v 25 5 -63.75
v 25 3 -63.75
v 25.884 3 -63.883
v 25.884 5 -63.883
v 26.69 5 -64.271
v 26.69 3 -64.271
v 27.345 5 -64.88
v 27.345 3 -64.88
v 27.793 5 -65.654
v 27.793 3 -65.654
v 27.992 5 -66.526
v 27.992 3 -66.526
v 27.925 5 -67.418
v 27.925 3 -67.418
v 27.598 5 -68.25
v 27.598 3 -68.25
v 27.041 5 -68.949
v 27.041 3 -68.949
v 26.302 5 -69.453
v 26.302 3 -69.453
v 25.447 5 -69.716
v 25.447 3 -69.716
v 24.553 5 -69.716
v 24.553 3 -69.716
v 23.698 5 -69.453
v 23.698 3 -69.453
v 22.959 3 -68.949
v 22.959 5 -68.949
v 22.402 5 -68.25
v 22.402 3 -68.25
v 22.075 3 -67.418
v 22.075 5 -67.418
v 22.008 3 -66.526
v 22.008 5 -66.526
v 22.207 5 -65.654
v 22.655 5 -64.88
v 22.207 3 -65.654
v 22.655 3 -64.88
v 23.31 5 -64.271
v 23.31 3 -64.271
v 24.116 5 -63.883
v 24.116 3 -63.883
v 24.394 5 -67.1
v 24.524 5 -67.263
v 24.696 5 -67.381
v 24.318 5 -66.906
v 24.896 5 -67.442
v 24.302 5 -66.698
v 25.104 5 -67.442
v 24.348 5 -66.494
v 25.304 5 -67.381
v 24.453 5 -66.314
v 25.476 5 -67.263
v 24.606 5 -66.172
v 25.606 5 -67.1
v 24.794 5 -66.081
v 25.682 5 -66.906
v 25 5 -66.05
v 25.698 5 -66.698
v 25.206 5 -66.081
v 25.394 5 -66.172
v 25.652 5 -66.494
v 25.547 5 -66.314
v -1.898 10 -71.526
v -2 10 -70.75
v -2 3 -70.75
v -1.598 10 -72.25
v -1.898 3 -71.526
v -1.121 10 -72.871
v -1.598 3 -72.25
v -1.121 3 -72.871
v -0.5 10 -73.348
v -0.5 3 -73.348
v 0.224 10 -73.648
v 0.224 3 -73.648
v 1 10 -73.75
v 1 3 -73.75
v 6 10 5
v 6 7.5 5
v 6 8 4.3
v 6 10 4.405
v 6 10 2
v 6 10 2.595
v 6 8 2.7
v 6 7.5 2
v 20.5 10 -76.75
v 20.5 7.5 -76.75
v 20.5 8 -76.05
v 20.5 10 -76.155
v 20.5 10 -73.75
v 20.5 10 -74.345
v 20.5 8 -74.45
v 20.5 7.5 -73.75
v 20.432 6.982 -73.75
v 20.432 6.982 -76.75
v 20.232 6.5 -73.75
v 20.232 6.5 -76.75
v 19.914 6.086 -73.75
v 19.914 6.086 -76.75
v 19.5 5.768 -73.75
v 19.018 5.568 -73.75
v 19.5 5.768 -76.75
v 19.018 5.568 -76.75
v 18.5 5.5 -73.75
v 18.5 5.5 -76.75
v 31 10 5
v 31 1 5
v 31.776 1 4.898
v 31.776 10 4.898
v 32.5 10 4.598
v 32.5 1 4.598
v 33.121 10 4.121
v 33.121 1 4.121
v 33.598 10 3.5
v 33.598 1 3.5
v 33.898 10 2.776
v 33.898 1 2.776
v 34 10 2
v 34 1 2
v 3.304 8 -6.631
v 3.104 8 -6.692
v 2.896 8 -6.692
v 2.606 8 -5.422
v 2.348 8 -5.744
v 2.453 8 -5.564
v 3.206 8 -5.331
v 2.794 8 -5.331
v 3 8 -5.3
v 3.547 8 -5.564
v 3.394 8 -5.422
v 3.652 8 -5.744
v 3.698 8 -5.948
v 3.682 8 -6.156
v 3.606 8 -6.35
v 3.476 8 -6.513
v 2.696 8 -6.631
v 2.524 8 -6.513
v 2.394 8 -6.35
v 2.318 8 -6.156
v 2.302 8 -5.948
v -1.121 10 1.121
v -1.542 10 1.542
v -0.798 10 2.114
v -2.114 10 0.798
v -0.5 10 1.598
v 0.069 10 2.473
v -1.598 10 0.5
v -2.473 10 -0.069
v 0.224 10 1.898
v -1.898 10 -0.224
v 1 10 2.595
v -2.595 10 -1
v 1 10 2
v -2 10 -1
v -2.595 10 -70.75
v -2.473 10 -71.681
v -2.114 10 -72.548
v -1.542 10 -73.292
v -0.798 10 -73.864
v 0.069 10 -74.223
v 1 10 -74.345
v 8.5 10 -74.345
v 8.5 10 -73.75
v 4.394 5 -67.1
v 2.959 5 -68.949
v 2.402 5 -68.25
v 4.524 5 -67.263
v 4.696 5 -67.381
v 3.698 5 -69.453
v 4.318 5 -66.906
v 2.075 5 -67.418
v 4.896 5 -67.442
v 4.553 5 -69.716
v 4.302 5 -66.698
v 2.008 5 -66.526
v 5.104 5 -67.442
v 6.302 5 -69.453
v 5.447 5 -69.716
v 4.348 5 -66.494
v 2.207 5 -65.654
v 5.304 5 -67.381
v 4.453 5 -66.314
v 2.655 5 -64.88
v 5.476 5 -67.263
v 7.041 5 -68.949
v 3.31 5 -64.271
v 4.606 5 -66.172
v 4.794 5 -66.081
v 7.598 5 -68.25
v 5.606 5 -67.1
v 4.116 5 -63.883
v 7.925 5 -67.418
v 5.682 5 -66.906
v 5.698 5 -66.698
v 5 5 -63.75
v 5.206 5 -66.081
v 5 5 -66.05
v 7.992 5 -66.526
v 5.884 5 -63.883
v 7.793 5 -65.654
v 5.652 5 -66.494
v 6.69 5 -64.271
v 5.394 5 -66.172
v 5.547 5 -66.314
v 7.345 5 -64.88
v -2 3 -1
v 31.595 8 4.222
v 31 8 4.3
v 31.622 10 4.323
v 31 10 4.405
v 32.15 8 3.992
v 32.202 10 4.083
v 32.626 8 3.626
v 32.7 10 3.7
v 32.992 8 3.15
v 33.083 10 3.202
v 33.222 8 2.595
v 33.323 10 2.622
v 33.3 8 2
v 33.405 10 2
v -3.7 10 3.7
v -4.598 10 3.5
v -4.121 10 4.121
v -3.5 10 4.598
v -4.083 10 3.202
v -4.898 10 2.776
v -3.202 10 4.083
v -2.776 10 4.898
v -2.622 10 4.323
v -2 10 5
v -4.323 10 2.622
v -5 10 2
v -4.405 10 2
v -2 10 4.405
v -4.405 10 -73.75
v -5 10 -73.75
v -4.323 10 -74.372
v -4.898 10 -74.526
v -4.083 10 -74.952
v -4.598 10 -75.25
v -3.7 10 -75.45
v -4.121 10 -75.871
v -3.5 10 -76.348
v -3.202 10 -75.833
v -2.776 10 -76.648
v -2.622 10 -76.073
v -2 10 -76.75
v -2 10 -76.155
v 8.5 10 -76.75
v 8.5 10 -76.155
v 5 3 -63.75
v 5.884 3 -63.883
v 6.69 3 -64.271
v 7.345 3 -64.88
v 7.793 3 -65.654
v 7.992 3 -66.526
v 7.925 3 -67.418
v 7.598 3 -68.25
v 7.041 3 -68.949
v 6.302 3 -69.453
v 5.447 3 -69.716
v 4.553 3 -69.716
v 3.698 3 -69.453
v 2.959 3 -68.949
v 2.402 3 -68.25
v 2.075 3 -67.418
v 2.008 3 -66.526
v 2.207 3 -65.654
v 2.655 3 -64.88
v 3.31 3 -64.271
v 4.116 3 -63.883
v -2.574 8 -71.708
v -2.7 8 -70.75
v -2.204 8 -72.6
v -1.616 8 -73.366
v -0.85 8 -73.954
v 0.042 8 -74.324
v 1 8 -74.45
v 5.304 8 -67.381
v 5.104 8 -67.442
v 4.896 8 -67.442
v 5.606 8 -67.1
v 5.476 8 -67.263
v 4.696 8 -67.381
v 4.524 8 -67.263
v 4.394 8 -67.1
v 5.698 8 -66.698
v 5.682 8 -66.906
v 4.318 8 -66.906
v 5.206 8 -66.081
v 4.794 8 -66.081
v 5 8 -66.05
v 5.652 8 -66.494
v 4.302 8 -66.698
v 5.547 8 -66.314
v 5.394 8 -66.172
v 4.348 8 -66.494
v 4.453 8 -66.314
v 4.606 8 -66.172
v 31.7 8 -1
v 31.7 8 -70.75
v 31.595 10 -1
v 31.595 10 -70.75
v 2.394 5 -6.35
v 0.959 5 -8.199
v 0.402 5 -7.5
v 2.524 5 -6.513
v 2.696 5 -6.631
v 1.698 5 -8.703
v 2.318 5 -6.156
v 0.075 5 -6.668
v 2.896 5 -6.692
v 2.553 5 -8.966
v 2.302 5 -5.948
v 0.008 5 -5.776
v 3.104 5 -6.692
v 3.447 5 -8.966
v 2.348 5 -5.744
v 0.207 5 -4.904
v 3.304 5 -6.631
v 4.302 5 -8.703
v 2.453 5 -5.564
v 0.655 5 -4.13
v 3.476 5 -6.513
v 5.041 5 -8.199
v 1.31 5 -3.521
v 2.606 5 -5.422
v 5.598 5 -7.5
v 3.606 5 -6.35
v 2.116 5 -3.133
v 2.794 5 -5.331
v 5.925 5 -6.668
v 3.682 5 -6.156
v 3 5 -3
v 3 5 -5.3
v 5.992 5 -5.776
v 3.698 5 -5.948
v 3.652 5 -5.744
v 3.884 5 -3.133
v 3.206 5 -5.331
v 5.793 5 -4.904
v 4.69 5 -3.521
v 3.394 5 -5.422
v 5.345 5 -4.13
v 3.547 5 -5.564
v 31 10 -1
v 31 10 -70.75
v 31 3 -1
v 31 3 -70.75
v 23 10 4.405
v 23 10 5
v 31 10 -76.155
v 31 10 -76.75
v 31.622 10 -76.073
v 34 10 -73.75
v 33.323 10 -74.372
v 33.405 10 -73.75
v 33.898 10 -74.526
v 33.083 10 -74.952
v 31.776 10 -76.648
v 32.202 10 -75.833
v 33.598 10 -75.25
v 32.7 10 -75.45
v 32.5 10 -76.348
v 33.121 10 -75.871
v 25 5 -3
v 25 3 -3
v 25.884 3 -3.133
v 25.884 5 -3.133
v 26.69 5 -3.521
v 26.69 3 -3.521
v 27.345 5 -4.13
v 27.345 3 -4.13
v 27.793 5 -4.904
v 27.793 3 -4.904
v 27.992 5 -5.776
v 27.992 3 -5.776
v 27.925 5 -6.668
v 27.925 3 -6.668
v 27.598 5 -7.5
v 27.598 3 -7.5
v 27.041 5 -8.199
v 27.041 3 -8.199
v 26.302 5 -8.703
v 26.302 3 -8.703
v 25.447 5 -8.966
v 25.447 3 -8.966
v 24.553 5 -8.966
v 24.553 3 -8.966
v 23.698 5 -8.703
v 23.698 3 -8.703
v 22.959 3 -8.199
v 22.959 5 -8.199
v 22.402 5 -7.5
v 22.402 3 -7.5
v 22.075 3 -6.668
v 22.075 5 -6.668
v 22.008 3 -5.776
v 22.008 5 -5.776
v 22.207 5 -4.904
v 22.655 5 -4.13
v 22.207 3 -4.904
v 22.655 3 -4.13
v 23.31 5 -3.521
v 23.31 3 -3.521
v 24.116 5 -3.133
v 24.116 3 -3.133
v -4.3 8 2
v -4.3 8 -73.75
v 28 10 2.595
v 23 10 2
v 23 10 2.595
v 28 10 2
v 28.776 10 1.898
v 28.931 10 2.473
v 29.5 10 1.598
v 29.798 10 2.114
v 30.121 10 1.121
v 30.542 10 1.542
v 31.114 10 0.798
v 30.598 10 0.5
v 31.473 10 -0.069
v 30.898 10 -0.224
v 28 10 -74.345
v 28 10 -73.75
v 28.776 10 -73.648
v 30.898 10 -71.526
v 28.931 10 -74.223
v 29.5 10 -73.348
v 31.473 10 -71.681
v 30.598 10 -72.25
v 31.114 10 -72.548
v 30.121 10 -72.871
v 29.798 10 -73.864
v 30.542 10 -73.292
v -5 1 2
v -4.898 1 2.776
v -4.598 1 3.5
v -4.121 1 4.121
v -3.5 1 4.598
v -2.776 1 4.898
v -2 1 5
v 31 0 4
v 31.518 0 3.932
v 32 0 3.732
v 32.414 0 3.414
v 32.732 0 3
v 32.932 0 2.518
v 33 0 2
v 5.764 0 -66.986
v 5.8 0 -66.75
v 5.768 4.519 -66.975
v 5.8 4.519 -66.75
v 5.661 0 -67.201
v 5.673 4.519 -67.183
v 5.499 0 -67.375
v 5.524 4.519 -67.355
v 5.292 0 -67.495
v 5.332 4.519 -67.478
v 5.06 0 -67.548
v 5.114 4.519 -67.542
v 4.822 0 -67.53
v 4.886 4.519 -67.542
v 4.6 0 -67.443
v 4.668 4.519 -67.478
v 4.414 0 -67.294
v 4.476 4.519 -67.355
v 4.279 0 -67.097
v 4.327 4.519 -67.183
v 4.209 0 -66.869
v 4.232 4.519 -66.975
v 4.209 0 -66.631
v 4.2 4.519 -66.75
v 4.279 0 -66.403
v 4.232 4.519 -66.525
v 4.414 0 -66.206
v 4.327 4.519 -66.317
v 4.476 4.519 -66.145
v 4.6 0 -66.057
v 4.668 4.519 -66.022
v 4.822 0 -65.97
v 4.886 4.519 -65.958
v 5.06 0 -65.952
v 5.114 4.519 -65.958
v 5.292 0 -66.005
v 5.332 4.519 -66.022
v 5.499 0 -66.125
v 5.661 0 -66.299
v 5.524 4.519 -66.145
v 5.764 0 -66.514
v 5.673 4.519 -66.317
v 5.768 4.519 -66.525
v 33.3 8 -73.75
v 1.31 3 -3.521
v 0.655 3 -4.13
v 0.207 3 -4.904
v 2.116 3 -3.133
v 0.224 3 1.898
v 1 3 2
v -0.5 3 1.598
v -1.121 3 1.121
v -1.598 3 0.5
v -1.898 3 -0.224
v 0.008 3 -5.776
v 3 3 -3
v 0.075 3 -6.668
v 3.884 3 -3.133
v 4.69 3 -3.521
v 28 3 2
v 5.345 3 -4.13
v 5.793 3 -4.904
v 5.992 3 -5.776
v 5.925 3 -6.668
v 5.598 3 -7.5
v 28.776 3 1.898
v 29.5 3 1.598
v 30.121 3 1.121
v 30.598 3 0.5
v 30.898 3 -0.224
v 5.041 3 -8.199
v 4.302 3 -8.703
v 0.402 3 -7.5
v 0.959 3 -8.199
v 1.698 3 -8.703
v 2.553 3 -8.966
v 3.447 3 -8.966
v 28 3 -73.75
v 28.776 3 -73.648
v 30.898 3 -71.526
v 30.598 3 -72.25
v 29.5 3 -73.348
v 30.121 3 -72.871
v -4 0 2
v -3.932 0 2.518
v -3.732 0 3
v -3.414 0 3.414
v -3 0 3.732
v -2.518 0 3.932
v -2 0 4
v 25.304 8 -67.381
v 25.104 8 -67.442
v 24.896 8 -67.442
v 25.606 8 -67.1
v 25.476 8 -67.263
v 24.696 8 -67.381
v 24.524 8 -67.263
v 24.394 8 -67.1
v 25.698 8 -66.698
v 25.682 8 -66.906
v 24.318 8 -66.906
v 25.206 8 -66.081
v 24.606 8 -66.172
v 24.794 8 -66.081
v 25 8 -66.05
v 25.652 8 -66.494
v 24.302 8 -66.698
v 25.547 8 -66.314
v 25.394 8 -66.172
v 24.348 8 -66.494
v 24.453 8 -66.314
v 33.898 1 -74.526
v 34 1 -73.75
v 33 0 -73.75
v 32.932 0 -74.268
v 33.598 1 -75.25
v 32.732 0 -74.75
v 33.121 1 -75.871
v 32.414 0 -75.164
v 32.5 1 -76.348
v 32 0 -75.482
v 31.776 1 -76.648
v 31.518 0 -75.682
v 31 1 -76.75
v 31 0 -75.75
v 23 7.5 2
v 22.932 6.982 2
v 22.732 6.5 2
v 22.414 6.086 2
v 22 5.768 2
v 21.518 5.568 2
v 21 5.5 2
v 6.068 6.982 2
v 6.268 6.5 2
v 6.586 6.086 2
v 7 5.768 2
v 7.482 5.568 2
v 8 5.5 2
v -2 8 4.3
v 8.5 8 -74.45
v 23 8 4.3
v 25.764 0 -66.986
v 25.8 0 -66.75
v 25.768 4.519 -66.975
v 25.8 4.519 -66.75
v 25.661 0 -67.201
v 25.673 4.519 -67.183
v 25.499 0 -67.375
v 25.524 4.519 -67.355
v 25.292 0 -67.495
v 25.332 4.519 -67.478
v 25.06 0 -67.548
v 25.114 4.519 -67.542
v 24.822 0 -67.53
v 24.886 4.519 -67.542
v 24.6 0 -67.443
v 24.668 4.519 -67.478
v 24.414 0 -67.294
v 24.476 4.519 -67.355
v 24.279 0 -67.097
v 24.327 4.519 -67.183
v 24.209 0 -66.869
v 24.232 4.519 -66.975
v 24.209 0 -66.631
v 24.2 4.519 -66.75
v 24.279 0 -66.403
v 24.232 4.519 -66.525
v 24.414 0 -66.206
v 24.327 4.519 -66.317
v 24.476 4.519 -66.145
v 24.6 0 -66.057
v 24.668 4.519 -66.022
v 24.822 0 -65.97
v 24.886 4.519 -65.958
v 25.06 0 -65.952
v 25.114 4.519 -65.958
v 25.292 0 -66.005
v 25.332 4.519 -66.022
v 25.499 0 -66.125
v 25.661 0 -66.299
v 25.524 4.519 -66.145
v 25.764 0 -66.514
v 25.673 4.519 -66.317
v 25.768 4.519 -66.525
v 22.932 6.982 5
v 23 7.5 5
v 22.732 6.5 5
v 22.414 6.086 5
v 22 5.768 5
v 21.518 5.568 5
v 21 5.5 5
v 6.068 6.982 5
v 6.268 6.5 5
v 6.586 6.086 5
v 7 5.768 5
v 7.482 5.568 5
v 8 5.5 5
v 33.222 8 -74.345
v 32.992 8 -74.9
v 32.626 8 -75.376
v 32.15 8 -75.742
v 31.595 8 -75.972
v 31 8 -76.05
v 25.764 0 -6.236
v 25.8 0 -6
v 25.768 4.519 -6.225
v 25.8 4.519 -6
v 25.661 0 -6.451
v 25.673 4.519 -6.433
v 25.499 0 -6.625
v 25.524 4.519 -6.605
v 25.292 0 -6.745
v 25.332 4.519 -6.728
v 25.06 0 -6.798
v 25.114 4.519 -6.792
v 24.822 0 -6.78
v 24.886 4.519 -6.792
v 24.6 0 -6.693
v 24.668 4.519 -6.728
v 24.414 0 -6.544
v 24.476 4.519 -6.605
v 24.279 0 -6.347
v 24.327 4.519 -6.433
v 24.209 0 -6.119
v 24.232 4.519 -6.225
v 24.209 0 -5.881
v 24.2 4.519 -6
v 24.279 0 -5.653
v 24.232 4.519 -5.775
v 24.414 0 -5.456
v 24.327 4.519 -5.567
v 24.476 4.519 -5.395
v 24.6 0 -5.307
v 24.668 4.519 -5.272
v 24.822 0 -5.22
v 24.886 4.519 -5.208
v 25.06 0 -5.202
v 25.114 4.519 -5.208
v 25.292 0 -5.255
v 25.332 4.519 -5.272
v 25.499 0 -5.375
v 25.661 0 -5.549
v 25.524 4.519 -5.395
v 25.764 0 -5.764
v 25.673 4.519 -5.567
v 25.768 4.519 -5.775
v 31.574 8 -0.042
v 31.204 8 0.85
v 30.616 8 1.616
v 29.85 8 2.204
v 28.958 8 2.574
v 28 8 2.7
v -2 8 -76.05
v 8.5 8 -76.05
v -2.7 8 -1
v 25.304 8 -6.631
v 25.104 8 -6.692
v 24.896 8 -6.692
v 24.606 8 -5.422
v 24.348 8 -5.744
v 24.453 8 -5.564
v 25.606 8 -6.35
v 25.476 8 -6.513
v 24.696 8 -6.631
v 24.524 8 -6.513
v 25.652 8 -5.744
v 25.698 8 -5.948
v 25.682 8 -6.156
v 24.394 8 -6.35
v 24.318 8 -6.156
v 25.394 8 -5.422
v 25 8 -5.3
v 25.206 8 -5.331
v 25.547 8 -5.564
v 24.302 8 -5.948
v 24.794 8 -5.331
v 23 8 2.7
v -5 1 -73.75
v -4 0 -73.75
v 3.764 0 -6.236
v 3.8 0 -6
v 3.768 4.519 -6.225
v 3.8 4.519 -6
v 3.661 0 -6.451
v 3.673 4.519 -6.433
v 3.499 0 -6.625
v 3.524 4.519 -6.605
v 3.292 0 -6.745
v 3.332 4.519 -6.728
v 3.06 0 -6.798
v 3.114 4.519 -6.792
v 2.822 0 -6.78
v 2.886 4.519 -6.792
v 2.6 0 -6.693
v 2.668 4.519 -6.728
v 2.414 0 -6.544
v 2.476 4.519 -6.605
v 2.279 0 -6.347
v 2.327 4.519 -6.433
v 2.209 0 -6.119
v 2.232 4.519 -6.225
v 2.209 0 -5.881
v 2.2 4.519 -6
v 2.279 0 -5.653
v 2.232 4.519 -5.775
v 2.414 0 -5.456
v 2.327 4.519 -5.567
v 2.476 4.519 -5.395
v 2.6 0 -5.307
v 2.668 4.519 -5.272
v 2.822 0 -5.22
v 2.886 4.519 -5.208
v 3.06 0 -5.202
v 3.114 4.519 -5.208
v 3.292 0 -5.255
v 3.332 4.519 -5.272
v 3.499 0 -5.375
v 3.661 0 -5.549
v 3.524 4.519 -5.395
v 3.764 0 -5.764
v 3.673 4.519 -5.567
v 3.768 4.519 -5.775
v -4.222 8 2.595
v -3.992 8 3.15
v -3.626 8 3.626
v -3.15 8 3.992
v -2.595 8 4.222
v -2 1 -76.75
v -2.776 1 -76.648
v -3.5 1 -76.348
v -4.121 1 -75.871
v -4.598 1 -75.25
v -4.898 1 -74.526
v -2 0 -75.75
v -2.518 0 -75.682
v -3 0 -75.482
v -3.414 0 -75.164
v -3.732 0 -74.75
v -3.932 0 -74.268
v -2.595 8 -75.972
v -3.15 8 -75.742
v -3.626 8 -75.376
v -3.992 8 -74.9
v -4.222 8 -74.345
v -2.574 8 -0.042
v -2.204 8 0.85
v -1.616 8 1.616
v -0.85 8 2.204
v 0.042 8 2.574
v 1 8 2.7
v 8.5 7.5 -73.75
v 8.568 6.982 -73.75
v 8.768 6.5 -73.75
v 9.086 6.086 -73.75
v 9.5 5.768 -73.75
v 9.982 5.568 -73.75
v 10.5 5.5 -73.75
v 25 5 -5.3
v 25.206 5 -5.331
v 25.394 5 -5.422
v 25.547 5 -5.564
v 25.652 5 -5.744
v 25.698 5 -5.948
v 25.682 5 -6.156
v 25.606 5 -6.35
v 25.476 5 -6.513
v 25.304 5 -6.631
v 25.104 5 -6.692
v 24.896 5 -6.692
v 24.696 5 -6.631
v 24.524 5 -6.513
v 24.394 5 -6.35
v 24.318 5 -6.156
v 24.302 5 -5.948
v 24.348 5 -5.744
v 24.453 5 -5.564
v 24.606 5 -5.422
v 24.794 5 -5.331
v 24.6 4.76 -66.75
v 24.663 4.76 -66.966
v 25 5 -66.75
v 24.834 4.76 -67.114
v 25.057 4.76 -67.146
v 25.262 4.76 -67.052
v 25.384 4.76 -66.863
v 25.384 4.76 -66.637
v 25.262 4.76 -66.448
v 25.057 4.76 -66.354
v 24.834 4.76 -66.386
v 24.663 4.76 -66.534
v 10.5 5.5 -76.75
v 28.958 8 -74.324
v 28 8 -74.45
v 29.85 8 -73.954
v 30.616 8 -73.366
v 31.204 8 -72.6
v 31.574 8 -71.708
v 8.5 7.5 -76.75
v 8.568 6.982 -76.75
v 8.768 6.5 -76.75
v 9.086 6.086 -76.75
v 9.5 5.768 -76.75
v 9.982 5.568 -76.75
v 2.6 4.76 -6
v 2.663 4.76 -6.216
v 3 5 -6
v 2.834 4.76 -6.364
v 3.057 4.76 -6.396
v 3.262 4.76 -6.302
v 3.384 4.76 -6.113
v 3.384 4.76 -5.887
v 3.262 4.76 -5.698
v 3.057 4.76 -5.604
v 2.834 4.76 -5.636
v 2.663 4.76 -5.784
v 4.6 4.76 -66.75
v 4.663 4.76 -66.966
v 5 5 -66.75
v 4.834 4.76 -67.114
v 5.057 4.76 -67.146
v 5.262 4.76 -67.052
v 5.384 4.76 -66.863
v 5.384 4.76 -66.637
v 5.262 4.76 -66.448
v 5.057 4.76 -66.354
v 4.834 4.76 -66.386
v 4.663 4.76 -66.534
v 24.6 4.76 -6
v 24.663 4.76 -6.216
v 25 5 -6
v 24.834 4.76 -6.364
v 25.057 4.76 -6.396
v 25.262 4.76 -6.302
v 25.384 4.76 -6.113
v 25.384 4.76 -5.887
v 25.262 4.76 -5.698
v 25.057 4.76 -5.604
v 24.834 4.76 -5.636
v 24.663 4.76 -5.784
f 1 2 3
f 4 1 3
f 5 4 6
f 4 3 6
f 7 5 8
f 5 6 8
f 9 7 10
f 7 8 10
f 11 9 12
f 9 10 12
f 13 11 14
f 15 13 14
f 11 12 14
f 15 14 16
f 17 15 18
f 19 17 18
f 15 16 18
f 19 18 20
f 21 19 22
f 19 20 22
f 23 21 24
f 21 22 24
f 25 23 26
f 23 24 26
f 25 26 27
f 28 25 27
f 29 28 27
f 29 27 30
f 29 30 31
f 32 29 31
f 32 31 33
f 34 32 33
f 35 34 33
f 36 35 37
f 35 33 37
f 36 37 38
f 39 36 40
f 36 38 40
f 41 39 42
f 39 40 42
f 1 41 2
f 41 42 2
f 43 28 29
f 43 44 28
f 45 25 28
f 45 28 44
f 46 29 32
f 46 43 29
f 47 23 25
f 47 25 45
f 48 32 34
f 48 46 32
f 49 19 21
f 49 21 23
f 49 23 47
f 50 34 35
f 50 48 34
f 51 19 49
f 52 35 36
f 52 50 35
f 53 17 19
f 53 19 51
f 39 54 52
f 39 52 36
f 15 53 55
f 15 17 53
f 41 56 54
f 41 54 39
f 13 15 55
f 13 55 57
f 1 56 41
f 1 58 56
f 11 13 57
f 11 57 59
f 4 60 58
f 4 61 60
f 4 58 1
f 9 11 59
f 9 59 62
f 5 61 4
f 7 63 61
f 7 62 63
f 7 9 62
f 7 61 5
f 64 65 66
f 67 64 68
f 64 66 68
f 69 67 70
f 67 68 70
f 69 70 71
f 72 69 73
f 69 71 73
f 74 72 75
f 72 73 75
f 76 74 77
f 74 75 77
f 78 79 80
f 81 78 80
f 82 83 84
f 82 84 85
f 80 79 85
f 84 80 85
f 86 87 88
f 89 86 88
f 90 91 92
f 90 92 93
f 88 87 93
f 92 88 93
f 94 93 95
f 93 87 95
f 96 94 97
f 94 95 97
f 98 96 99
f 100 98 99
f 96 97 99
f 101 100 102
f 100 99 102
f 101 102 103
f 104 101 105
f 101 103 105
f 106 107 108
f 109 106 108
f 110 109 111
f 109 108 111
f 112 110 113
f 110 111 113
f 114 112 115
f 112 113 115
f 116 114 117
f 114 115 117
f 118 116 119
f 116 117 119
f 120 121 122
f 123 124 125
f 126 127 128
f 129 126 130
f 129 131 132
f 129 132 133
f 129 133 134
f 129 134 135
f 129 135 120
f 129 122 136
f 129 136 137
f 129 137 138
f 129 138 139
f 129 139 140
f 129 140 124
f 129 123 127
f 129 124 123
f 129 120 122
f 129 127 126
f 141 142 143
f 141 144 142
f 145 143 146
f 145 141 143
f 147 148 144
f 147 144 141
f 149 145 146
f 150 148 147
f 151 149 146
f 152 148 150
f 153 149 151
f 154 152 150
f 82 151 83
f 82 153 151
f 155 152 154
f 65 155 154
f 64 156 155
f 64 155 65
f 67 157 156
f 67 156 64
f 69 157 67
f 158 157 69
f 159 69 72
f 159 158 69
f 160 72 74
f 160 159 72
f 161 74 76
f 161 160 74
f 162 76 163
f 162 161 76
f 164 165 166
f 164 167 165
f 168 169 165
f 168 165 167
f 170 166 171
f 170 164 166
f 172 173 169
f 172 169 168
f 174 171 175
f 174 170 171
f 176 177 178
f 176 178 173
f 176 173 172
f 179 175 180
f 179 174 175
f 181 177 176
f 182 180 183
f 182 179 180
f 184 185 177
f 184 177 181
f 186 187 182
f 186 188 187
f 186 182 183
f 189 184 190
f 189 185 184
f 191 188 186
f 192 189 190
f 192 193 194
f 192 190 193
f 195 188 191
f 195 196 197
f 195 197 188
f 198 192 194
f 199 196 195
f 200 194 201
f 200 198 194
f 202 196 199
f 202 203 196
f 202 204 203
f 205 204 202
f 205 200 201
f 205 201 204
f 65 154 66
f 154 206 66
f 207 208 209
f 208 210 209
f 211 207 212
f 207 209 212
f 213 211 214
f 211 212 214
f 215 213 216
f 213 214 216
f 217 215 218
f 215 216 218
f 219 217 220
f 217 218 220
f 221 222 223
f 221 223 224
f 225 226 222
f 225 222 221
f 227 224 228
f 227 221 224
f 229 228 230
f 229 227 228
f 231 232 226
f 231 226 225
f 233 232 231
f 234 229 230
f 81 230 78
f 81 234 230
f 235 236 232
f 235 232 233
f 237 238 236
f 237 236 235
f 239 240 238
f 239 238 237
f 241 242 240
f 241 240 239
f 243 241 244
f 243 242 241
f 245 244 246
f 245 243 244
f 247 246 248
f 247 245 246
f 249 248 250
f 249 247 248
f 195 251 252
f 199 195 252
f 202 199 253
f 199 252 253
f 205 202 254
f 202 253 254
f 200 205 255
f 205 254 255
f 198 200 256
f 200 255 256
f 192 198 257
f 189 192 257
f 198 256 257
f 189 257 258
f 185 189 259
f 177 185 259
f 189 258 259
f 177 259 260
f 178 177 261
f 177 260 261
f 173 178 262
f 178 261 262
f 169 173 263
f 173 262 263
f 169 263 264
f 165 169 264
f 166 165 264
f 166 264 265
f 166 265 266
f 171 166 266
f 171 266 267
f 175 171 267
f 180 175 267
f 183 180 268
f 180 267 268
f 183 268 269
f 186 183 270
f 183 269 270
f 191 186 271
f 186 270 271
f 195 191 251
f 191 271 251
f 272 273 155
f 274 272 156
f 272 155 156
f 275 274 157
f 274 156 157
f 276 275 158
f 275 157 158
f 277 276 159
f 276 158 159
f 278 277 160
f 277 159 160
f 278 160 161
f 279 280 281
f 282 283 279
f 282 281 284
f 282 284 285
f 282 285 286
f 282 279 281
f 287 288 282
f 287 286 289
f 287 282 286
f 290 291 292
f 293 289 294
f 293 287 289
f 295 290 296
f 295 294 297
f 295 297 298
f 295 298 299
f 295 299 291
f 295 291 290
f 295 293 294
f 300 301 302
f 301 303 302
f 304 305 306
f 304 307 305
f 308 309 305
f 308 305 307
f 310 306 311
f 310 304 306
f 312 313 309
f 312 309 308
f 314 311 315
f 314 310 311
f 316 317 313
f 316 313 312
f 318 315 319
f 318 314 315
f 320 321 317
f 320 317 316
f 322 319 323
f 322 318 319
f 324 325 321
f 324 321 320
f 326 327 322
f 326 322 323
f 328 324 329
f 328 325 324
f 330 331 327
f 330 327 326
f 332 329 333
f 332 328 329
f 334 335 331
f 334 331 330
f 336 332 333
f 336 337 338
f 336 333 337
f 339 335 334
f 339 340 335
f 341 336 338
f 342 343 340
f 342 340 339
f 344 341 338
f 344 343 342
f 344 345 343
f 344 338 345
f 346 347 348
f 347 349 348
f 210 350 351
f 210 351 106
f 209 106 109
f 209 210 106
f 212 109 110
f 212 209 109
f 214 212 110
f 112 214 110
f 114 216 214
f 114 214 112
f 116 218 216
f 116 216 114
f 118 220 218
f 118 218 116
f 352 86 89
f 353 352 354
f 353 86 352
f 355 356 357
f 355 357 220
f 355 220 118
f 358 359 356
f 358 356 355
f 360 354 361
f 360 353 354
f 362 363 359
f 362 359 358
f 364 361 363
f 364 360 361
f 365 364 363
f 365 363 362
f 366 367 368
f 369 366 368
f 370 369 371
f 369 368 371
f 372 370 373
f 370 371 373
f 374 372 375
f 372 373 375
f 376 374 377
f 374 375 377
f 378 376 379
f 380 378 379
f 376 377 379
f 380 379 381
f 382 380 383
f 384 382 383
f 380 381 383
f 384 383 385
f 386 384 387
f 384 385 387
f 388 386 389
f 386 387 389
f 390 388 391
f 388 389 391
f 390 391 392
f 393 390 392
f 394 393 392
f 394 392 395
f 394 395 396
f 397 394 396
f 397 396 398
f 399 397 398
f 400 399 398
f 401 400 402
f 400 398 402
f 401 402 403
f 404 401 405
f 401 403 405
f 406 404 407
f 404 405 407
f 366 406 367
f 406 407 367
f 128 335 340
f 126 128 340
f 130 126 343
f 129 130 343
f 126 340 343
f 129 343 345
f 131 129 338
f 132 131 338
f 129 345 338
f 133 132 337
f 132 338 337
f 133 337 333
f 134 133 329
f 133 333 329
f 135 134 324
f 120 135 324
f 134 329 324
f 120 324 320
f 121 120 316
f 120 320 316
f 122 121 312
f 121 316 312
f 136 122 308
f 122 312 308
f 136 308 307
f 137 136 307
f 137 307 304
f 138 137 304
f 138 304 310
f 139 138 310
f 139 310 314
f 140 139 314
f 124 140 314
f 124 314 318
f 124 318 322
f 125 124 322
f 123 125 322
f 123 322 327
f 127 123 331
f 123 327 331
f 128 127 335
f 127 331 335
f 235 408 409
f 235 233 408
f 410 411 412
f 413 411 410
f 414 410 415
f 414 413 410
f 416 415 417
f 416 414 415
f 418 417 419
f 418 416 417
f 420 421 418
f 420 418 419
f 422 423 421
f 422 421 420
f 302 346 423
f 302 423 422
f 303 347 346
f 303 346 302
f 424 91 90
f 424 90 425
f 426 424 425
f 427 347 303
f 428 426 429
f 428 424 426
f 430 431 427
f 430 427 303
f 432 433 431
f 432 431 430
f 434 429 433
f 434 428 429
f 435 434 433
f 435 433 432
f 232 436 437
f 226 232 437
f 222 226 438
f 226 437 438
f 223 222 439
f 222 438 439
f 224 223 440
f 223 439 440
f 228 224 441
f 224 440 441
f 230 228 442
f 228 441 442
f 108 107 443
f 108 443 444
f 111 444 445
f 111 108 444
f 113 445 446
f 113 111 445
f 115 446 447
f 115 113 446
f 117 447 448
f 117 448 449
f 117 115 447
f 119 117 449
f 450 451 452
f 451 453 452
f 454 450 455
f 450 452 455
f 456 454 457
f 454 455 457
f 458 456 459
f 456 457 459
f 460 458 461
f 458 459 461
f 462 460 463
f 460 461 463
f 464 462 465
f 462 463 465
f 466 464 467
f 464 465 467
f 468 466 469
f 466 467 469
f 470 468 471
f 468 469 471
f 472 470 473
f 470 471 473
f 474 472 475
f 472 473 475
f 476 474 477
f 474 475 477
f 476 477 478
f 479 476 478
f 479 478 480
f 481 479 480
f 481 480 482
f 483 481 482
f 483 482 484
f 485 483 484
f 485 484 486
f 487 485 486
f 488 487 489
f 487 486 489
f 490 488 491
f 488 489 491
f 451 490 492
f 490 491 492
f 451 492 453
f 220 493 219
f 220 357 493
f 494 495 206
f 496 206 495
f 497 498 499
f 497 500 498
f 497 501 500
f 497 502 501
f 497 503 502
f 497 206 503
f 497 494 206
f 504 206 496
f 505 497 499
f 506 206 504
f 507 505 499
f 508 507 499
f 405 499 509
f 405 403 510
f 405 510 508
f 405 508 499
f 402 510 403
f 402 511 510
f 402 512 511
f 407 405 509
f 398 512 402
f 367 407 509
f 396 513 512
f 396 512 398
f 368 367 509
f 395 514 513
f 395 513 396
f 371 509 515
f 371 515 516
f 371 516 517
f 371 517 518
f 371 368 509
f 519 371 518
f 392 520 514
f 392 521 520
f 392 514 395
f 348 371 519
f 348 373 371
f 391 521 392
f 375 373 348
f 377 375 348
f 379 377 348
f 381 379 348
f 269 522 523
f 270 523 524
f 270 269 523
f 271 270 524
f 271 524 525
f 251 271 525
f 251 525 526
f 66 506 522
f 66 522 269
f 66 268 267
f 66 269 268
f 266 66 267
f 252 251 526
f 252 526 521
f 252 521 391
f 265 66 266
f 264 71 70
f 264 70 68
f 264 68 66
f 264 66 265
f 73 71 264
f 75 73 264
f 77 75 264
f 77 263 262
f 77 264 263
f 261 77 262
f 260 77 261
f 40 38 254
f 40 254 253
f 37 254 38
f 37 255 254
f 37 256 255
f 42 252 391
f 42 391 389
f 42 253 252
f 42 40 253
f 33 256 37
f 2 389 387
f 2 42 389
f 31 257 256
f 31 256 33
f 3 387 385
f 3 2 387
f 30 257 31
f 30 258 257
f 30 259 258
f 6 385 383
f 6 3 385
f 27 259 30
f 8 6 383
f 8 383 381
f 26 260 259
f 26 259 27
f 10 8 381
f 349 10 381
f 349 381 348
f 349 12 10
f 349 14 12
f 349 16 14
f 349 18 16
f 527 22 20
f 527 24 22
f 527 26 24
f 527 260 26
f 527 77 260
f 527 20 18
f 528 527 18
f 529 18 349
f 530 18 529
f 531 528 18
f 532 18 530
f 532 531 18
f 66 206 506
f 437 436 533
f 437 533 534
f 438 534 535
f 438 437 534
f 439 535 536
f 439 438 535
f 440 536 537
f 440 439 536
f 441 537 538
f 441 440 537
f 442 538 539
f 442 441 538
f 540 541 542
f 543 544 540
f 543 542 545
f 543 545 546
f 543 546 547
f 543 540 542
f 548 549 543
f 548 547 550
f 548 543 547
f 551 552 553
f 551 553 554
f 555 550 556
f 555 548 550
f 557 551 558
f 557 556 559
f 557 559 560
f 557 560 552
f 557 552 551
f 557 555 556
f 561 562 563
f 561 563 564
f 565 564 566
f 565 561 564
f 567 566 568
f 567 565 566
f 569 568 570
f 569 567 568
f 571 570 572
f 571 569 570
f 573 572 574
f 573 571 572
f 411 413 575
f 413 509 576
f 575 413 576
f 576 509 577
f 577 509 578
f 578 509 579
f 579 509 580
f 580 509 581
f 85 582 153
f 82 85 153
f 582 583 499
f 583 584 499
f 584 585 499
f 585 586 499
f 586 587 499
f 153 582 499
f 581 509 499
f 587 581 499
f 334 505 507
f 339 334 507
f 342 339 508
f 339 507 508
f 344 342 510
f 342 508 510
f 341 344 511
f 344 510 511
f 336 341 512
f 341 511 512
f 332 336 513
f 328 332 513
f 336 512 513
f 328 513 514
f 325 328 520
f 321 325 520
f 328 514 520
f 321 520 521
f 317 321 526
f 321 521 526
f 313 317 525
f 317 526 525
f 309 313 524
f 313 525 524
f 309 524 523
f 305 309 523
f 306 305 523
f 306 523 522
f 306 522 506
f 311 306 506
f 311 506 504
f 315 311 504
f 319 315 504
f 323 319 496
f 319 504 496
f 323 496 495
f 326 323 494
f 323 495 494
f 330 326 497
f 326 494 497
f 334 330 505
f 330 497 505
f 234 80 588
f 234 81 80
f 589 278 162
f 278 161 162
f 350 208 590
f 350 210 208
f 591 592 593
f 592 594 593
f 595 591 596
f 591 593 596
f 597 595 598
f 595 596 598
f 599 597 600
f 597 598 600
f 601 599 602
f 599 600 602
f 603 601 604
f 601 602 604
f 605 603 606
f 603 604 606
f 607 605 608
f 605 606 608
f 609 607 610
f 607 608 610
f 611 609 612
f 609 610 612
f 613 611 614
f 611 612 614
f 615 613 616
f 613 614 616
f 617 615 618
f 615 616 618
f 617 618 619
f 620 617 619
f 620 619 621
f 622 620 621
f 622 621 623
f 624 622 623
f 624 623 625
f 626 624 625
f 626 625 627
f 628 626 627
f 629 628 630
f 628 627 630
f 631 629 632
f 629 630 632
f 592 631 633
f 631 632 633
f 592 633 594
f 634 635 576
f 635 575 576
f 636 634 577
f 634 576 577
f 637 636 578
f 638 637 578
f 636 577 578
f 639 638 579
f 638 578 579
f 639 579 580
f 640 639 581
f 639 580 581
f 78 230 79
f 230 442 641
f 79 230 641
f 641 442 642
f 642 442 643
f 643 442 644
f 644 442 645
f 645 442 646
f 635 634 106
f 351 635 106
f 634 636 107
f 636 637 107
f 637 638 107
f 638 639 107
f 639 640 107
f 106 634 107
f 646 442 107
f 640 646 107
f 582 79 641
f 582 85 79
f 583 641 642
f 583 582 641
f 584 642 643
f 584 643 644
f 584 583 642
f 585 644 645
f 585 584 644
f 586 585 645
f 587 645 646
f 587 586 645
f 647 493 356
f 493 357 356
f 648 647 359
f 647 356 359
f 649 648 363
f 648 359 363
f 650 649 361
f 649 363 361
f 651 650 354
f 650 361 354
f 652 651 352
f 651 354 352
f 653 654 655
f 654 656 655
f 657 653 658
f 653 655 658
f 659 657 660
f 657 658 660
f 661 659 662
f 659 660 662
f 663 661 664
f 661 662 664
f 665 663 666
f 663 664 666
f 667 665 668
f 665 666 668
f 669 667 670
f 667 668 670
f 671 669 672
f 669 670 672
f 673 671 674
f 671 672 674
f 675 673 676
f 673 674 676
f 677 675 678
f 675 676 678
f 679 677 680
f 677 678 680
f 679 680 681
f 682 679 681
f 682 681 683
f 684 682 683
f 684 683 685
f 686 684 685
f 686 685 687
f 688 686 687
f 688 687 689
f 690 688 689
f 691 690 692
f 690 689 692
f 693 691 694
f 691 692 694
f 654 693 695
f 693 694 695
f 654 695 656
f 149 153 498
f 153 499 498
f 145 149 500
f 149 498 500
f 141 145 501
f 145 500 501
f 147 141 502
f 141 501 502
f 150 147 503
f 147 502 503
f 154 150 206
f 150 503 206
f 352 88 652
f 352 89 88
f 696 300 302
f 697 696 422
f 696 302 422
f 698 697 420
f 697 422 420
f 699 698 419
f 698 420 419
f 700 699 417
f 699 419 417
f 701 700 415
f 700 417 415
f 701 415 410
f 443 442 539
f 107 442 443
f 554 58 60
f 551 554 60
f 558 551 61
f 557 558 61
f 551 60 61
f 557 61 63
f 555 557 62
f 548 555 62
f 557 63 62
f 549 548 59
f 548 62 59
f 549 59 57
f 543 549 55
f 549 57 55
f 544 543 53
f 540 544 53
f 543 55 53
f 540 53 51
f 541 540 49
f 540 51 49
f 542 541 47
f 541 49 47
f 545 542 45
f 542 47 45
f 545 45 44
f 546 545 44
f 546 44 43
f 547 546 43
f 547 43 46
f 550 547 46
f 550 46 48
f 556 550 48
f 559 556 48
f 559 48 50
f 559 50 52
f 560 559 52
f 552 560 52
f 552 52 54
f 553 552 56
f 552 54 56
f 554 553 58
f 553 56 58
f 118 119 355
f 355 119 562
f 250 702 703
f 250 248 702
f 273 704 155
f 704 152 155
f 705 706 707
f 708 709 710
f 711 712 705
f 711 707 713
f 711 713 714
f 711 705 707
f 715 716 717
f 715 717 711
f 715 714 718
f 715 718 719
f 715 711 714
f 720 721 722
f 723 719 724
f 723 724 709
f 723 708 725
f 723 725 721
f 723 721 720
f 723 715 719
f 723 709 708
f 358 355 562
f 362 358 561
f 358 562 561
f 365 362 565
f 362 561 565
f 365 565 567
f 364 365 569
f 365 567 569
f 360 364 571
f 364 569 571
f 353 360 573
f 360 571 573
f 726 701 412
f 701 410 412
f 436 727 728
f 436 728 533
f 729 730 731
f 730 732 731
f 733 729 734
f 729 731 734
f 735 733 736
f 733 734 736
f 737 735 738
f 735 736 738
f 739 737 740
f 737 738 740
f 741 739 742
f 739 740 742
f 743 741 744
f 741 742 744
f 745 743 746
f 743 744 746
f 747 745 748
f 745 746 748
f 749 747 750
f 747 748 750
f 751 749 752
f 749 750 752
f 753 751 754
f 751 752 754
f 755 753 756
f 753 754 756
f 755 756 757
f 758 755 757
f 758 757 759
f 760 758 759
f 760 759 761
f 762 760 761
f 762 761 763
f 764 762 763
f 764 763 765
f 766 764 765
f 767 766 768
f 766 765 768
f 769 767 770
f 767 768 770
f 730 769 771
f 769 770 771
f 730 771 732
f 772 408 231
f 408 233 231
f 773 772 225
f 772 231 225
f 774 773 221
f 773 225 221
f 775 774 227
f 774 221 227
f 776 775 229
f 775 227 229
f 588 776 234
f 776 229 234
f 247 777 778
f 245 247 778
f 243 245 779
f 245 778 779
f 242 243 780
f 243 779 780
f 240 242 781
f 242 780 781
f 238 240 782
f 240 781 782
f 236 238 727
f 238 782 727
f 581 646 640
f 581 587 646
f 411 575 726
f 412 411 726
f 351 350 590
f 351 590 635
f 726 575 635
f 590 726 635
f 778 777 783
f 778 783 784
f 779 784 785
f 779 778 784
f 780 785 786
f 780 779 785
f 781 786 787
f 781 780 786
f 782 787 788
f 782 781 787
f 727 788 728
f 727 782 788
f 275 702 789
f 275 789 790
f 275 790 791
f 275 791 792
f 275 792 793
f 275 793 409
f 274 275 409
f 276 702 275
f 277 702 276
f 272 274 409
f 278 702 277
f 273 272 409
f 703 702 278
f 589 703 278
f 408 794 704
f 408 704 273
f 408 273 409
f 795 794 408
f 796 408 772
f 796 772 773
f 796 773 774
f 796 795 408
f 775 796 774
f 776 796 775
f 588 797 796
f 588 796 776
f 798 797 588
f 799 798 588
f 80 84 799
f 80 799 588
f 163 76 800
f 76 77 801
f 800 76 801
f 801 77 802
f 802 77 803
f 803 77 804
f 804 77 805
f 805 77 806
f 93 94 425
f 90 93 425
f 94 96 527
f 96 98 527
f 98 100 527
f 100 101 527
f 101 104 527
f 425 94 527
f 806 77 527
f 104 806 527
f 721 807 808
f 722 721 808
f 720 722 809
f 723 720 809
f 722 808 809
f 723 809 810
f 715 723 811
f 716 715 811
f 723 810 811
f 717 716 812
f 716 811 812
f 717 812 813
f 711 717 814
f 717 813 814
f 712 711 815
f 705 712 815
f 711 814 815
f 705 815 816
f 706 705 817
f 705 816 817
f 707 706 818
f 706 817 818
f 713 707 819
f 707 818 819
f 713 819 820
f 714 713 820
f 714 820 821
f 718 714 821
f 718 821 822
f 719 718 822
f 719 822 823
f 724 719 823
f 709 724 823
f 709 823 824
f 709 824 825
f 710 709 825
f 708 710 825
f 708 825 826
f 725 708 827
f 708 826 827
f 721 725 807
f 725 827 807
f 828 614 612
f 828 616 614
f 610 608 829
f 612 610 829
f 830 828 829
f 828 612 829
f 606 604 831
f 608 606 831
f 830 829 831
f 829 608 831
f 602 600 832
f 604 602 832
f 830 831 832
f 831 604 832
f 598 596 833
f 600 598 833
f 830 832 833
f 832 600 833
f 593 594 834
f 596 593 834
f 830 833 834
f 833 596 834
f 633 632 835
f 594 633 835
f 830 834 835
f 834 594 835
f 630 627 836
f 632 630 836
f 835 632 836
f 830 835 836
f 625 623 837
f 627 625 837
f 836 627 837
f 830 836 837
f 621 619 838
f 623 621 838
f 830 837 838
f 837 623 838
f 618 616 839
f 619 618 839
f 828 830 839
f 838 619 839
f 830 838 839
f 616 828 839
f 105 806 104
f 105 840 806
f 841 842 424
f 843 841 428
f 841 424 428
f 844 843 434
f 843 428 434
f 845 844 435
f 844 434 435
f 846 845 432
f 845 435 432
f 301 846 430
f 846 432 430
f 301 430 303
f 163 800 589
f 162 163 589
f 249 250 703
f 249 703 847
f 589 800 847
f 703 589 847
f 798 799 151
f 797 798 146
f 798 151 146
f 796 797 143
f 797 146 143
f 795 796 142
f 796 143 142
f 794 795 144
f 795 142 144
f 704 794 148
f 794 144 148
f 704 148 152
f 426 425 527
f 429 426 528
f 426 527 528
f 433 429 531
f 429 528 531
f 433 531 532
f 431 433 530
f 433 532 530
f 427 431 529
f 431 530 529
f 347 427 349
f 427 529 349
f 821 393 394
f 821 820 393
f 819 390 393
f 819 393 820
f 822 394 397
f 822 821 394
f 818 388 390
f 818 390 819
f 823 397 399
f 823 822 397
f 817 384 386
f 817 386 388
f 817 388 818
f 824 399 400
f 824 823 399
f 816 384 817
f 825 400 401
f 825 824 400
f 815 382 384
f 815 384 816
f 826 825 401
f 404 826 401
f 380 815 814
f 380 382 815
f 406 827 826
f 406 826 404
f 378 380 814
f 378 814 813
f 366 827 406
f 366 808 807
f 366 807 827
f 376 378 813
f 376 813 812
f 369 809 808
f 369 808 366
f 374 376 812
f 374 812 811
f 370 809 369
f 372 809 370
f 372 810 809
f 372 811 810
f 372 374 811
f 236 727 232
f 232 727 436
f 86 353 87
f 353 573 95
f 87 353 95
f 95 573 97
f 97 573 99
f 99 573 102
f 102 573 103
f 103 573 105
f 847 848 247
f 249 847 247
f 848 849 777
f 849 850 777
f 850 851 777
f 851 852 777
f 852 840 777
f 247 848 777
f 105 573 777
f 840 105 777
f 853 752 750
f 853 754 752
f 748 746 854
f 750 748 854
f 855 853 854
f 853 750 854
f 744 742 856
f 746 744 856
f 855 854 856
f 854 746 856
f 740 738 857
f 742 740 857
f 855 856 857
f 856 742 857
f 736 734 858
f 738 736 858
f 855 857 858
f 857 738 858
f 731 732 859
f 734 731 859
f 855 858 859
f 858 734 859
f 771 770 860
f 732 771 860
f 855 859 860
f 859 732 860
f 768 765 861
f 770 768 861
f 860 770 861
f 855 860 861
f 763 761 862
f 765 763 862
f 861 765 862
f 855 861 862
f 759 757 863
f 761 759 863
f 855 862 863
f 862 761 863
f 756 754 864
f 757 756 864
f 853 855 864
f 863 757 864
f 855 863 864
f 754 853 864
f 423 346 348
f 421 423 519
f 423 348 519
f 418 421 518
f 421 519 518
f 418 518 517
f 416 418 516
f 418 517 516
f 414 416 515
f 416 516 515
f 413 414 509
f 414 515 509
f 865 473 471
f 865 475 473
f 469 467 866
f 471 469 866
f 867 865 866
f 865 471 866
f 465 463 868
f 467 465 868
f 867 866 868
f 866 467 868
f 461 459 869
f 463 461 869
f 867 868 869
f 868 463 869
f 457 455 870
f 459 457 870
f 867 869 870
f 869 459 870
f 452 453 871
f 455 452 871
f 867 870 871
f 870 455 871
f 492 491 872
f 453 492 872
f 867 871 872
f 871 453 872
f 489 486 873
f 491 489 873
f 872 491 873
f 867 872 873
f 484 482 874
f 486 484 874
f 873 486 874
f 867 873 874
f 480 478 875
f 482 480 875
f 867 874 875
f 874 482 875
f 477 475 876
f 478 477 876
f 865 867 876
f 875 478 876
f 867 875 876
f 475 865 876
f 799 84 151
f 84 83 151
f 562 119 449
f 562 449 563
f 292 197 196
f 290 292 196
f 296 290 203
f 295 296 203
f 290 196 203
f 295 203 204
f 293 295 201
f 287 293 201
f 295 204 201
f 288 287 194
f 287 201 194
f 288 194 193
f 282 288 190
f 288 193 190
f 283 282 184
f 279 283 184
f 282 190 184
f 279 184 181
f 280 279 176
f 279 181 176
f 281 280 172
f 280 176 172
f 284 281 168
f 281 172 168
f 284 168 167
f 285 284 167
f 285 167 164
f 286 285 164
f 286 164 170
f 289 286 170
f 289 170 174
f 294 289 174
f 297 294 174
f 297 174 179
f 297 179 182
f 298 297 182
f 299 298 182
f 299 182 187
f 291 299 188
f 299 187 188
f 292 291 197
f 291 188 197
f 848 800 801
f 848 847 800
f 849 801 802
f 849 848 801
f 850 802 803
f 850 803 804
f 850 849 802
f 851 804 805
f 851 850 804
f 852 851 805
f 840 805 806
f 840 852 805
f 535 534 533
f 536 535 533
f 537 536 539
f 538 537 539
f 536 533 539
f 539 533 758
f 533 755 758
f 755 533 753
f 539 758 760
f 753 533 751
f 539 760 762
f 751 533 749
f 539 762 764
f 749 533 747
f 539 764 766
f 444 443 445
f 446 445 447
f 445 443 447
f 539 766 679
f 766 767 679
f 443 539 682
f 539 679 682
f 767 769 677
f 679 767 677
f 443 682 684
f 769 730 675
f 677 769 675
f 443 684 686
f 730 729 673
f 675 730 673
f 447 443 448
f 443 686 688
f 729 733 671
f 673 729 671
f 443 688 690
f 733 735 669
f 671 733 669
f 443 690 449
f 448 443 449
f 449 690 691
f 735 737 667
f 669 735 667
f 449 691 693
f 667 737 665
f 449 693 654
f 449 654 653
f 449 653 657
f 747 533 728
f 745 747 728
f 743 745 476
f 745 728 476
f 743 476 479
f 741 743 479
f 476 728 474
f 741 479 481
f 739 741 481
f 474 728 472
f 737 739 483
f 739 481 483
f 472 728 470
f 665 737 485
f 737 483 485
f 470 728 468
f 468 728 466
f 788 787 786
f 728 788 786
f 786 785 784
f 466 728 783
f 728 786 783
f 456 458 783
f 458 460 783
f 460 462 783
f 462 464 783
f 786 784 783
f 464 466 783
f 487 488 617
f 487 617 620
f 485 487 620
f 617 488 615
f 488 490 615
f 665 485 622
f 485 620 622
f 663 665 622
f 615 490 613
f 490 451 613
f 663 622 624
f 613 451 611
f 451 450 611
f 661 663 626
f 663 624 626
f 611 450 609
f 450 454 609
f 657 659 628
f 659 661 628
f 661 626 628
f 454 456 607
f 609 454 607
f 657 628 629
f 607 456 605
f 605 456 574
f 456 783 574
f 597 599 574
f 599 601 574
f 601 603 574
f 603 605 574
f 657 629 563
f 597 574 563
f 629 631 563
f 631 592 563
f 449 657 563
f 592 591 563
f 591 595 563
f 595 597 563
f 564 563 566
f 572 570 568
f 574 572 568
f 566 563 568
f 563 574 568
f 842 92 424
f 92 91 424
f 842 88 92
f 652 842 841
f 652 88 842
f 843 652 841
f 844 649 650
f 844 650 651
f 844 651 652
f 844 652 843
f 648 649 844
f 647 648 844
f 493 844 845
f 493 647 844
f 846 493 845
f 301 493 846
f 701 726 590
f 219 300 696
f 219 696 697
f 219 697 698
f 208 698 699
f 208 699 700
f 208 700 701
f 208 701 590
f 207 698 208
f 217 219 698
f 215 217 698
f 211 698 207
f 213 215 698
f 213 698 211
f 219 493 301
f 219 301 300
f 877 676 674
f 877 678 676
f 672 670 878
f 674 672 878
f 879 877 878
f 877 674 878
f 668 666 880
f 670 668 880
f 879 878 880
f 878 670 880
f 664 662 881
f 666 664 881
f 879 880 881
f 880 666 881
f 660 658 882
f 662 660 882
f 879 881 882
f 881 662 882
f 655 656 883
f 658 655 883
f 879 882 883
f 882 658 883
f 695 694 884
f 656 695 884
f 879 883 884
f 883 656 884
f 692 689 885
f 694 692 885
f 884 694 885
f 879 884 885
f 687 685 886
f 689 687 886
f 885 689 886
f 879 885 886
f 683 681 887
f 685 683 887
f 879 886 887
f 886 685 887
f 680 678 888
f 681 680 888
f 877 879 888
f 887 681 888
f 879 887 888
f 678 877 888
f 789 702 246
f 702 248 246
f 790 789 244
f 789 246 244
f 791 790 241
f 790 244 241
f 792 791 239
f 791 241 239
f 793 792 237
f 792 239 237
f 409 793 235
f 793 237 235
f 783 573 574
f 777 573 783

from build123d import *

# Parameters (mm, degrees)
SKETCH1_W                       = 39
SKETCH1_H                       = 81.75
SKETCH1_R                       = 3
BOSS_EXTRUDE1_DEPTH             = 3
SKETCH3_W                       = 39
SKETCH3_H                       = 81.75
SKETCH3_W_2                     = 33
SKETCH3_H_2                     = 75.75
BOSS_EXTRUDE3_DEPTH             = 5
BOSS_EXTRUDE4_START             = 3
SKETCH1_3_R                     = 3
BOSS_EXTRUDE4_DEPTH             = 2
SKETCH8_R                       = 0.7
BOARD_MOUNTING_STANDOFFS_DEPTH  = 3
TAP_DRILL_FOR_M2X0_4_TAP1_D     = 1.6
TAP_DRILL_FOR_M2X0_4_TAP1_DEPTH = 4.519311505
TAP_DRILL_FOR_M2X0_4_TAP1_TIP   = 0.480688495
FILLET2_R                       = 3
SKETCH6_W                       = 12
SKETCH6_H                       = 3
SKETCH6_W_2                     = 17
CUT_EXTRUDE1_DEPTH              = 2.5
STANDOFFS1_LIP_START            = 8
STANDOFFS1_LIP_DEPTH            = 2
STANDOFFS2_LIP_START            = 8
STANDOFFS2_LIP_DEPTH            = 2
FILLET4_R                       = 2
CHAMFER1_SIZE                   = 1


with BuildPart() as part:
    # Sketch1 → Boss-Extrude1 (new body)
    # profile 1 of 5: a face of its own
    with BuildSketch(Plane(origin=(0, 0, 0), x_dir=(1, 0, 0), z_dir=(0, 1, 0))):
        with Locations((14.5, 35.875)):
            Rectangle(SKETCH1_W, SKETCH1_H)
        with Locations((3, 6)):
            Circle(SKETCH1_R, mode=Mode.SUBTRACT)
        with Locations((25, 6)):
            Circle(SKETCH1_R, mode=Mode.SUBTRACT)
        with Locations((5, 66.75)):
            Circle(SKETCH1_R, mode=Mode.SUBTRACT)
        with Locations((25, 66.75)):
            Circle(SKETCH1_R, mode=Mode.SUBTRACT)
    # profile 2 of 5: a face of its own
    with BuildSketch(Plane(origin=(0, 0, 0), x_dir=(1, 0, 0), z_dir=(0, 1, 0))):
        with Locations((5, 66.75)):
            Circle(SKETCH1_R)
    # profile 3 of 5: a face of its own
    with BuildSketch(Plane(origin=(0, 0, 0), x_dir=(1, 0, 0), z_dir=(0, 1, 0))):
        with Locations((25, 66.75)):
            Circle(SKETCH1_R)
    # profile 4 of 5: a face of its own
    with BuildSketch(Plane(origin=(0, 0, 0), x_dir=(1, 0, 0), z_dir=(0, 1, 0))):
        with Locations((25, 6)):
            Circle(SKETCH1_R)
    # profile 5 of 5: a face of its own
    with BuildSketch(Plane(origin=(0, 0, 0), x_dir=(1, 0, 0), z_dir=(0, 1, 0))):
        with Locations((3, 6)):
            Circle(SKETCH1_R)
    extrude(amount=BOSS_EXTRUDE1_DEPTH)

    # Sketch3 → Boss-Extrude3 (add)
    with BuildSketch(Plane(origin=(0, 3, 0), x_dir=(1, 0, 0), z_dir=(0, 1, 0))):
        with Locations((14.5, 35.875)):
            Rectangle(SKETCH3_W, SKETCH3_H)
        with Locations((14.5, 35.875)):
            Rectangle(SKETCH3_W_2, SKETCH3_H_2, mode=Mode.SUBTRACT)
    extrude(amount=BOSS_EXTRUDE3_DEPTH)

    # Sketch1<3> → Boss-Extrude4 (add)
    with BuildSketch(Plane(origin=(0, 0, 0), x_dir=(1, 0, 0), z_dir=(0, 1, 0)).offset(BOSS_EXTRUDE4_START)):
        with Locations(Location((3, 6, 0), (0, 0, 270))):
            Circle(SKETCH1_3_R)
        with Locations(Location((25, 6, 0), (0, 0, 270))):
            Circle(SKETCH1_3_R)
        with Locations(Location((25, 66.75, 0), (0, 0, 270))):
            Circle(SKETCH1_3_R)
        with Locations(Location((5, 66.75, 0), (0, 0, 270))):
            Circle(SKETCH1_3_R)
    extrude(amount=BOSS_EXTRUDE4_DEPTH)

    # Sketch8 → Board Mounting Standoffs (add)
    with BuildSketch(Plane(origin=(0, 5, 0), x_dir=(1, 0, 0), z_dir=(0, 1, 0))):
        with Locations(Location((5, 66.75, 0), (0, 0, 270))):
            Circle(SKETCH8_R)
        with Locations(Location((25, 66.75, 0), (0, 0, 270))):
            Circle(SKETCH8_R)
        with Locations(Location((3, 6, 0), (0, 0, 270))):
            Circle(SKETCH8_R)
        with Locations(Location((25, 6, 0), (0, 0, 270))):
            Circle(SKETCH8_R)
    extrude(amount=BOARD_MOUNTING_STANDOFFS_DEPTH)

    # Tap Drill for M2x0.4 Tap1
    with Locations(Plane(origin=(0, 0, 0), x_dir=(-1, 0, 0), z_dir=(0, -1, 0))):
        with Locations((-25, 66.75), (-5, 66.75), (-25, 6), (-3, 6)):
            Hole(TAP_DRILL_FOR_M2X0_4_TAP1_D / 2, depth=TAP_DRILL_FOR_M2X0_4_TAP1_DEPTH)
            with Locations((0, 0, -(TAP_DRILL_FOR_M2X0_4_TAP1_DEPTH + TAP_DRILL_FOR_M2X0_4_TAP1_TIP / 2))):  # 118° drill point
                Cone(0, TAP_DRILL_FOR_M2X0_4_TAP1_D / 2, TAP_DRILL_FOR_M2X0_4_TAP1_TIP, mode=Mode.SUBTRACT)

    # Fillet2
    fillet2_edges = [part.edges().sort_by_distance(p)[0] for p in [
        (-2, 5.5, -73.75),
        (-2, 5.5, 2),
        (31, 5.5, 2),
        (31, 5.5, -73.75),
        (-5, 4, -76.75),
        (34, 4, -76.75),
        (34, 4, 5),
        (-5, 4, 5),
    ]]
    fillet(fillet2_edges, radius=FILLET2_R)

    # Sketch6 → Cut-Extrude1 (cut)
    with BuildSketch(Plane(origin=(0, 8, 0), x_dir=(1, 0, 0), z_dir=(0, 1, 0))):
        with Locations((14.5, 75.25)):
            Rectangle(SKETCH6_W, SKETCH6_H)
        with Locations((14.5, -3.5)):
            Rectangle(SKETCH6_W_2, SKETCH6_H)
    extrude(amount=-CUT_EXTRUDE1_DEPTH, mode=Mode.SUBTRACT)

    # Standoffs1-Lip: read off the stored shape, not the designer's step
    # Standoffs1-Lip outline → Standoffs1-Lip (add)
    with BuildSketch(Plane(origin=(0, 0, 0), x_dir=(1, 0, 0), z_dir=(0, 1, 0)).offset(STANDOFFS1_LIP_START)):
        with BuildLine():
            Line((23, -5), (31, -5))
            ThreePointArc((31, -5), (33.121320344, -4.121320344), (34, -2))
            Line((34, -2), (34, 73.75))
            ThreePointArc((34, 73.75), (33.121320344, 75.871320344), (31, 76.75))
            Line((31, 76.75), (20.5, 76.75))
            Line((20.5, 76.75), (20.5, 73.75))
            Line((20.5, 73.75), (28, 73.75))
            ThreePointArc((28, 73.75), (30.121320344, 72.871320344), (31, 70.75))
            Line((31, 70.75), (31, 1))
            ThreePointArc((31, 1), (30.121320344, -1.121320344), (28, -2))
            Line((28, -2), (23, -2))
            Line((23, -2), (23, -5))
        make_face()
    extrude(amount=STANDOFFS1_LIP_DEPTH)

    # Standoffs1-Lip 2: loft between two sections, ruled curve by curve
    standoffs1_lip_2_from = [
        Edge.make_three_point_arc((33.3, 8, -73.75), (32.626345597, 8, -75.376345597), (31, 8, -76.05)),
        Edge.make_three_point_arc((31, 8, 4.3), (32.626345597, 8, 3.626345597), (33.3, 8, 2)),
        Edge.make_three_point_arc((31.7, 8, -1), (30.61629509, 8, 1.61629509), (28, 8, 2.7)),
        Edge.make_three_point_arc((28, 8, -74.45), (30.61629509, 8, -73.36629509), (31.7, 8, -70.75)),
        Edge.make_line((20.5, 8, -76.05), (31, 8, -76.05)),
        Edge.make_line((33.3, 8, -73.75), (33.3, 8, 2)),
        Edge.make_line((31, 8, 4.3), (23, 8, 4.3)),
        Edge.make_line((20.5, 8, -74.45), (28, 8, -74.45)),
        Edge.make_line((28, 8, 2.7), (23, 8, 2.7)),
        Edge.make_line((31.7, 8, -70.75), (31.7, 8, -1)),
        Edge.make_line((20.5, 8, -74.45), (20.5, 8, -76.05)),
        Edge.make_line((23, 8, 2.7), (23, 8, 4.3)),
    ]
    standoffs1_lip_2_to = [
        Edge.make_three_point_arc((33.404815559, 10, -73.75), (32.700461389, 10, -75.450461389), (31, 10, -76.154815559)),
        Edge.make_three_point_arc((31, 10, 4.404815559), (32.700461389, 10, 3.700461389), (33.404815559, 10, 2)),
        Edge.make_three_point_arc((31.595184441, 10, -1), (30.542179298, 10, 1.542179298), (28, 10, 2.595184441)),
        Edge.make_three_point_arc((28, 10, -74.345184441), (30.542179298, 10, -73.292179298), (31.595184441, 10, -70.75)),
        Edge.make_line((20.5, 10, -76.154815559), (31, 10, -76.154815559)),
        Edge.make_line((33.404815559, 10, -73.75), (33.404815559, 10, 2)),
        Edge.make_line((31, 10, 4.404815559), (23, 10, 4.404815559)),
        Edge.make_line((20.5, 10, -74.345184441), (28, 10, -74.345184441)),
        Edge.make_line((28, 10, 2.595184441), (23, 10, 2.595184441)),
        Edge.make_line((31.595184441, 10, -70.75), (31.595184441, 10, -1)),
        Edge.make_line((20.5, 10, -74.345184441), (20.5, 10, -76.154815559)),
        Edge.make_line((23, 10, 2.595184441), (23, 10, 4.404815559)),
    ]
    standoffs1_lip_2 = Solid(Shell([*[Face.make_surface_from_curves(standoffs1_lip_2_from[k], standoffs1_lip_2_to[k]) for k in range(12)], Face(Wire(standoffs1_lip_2_from)), Face(Wire(standoffs1_lip_2_to))]))
    add(standoffs1_lip_2, mode=Mode.SUBTRACT)

    # Standoffs2-Lip: read off the stored shape, not the designer's step
    # Standoffs2-Lip outline → Standoffs2-Lip (add)
    with BuildSketch(Plane(origin=(0, 0, 0), x_dir=(1, 0, 0), z_dir=(0, 1, 0)).offset(STANDOFFS2_LIP_START)):
        with BuildLine():
            ThreePointArc((-2, 76.75), (-4.121320344, 75.871320344), (-5, 73.75))
            Line((-5, 73.75), (-5, -2))
            ThreePointArc((-5, -2), (-4.121320344, -4.121320344), (-2, -5))
            Line((-2, -5), (6, -5))
            Line((6, -5), (6, -2))
            Line((6, -2), (1, -2))
            ThreePointArc((1, -2), (-1.121320344, -1.121320344), (-2, 1))
            Line((-2, 1), (-2, 70.75))
            ThreePointArc((-2, 70.75), (-1.121320344, 72.871320344), (1, 73.75))
            Line((1, 73.75), (8.5, 73.75))
            Line((8.5, 73.75), (8.5, 76.75))
            Line((8.5, 76.75), (-2, 76.75))
        make_face()
    extrude(amount=STANDOFFS2_LIP_DEPTH)

    # Standoffs2-Lip 2: loft between two sections, ruled curve by curve
    standoffs2_lip_2_from = [
        Edge.make_three_point_arc((-4.3, 8, 2), (-3.626345597, 8, 3.626345597), (-2, 8, 4.3)),
        Edge.make_three_point_arc((-2, 8, -76.05), (-3.626345597, 8, -75.376345597), (-4.3, 8, -73.75)),
        Edge.make_three_point_arc((-2.7, 8, -70.75), (-1.61629509, 8, -73.36629509), (1, 8, -74.45)),
        Edge.make_three_point_arc((1, 8, 2.7), (-1.61629509, 8, 1.61629509), (-2.7, 8, -1)),
        Edge.make_line((-2, 8, -76.05), (8.5, 8, -76.05)),
        Edge.make_line((6, 8, 4.3), (-2, 8, 4.3)),
        Edge.make_line((1, 8, -74.45), (8.5, 8, -74.45)),
        Edge.make_line((6, 8, 2.7), (1, 8, 2.7)),
        Edge.make_line((-4.3, 8, 2), (-4.3, 8, -73.75)),
        Edge.make_line((-2.7, 8, -1), (-2.7, 8, -70.75)),
        Edge.make_line((8.5, 8, -74.45), (8.5, 8, -76.05)),
        Edge.make_line((6, 8, 2.7), (6, 8, 4.3)),
    ]
    standoffs2_lip_2_to = [
        Edge.make_three_point_arc((-4.404815559, 10, 2), (-3.700461389, 10, 3.700461389), (-2, 10, 4.404815559)),
        Edge.make_three_point_arc((-2, 10, -76.154815559), (-3.700461389, 10, -75.450461389), (-4.404815559, 10, -73.75)),
        Edge.make_three_point_arc((-2.595184441, 10, -70.75), (-1.542179298, 10, -73.292179298), (1, 10, -74.345184441)),
        Edge.make_three_point_arc((1, 10, 2.595184441), (-1.542179298, 10, 1.542179298), (-2.595184441, 10, -1)),
        Edge.make_line((-2, 10, -76.154815559), (8.5, 10, -76.154815559)),
        Edge.make_line((6, 10, 4.404815559), (-2, 10, 4.404815559)),
        Edge.make_line((1, 10, -74.345184441), (8.5, 10, -74.345184441)),
        Edge.make_line((6, 10, 2.595184441), (1, 10, 2.595184441)),
        Edge.make_line((-4.404815559, 10, 2), (-4.404815559, 10, -73.75)),
        Edge.make_line((-2.595184441, 10, -1), (-2.595184441, 10, -70.75)),
        Edge.make_line((8.5, 10, -74.345184441), (8.5, 10, -76.154815559)),
        Edge.make_line((6, 10, 2.595184441), (6, 10, 4.404815559)),
    ]
    standoffs2_lip_2 = Solid(Shell([*[Face.make_surface_from_curves(standoffs2_lip_2_from[k], standoffs2_lip_2_to[k]) for k in range(12)], Face(Wire(standoffs2_lip_2_from)), Face(Wire(standoffs2_lip_2_to))]))
    add(standoffs2_lip_2, mode=Mode.SUBTRACT)

    # Fillet4
    fillet4_edges = [part.edges().sort_by_distance(p)[0] for p in [
        (8.5, 5.5, -75.25),
        (20.5, 5.5, -75.25),
        (6, 5.5, 3.5),
        (23, 5.5, 3.5),
    ]]
    fillet(fillet4_edges, radius=FILLET4_R)

    # Chamfer1
    chamfer1_edges = [part.edges().sort_by_distance(p)[0] for p in [
        (34, 0, -35.875),
        (-5, 0, -35.875),
        (14.5, 0, -76.75),
        (14.5, 0, 5),
        (33.121320344, 0, -75.871320344),
        (-4.121320344, 0, -75.871320344),
        (-4.121320344, 0, 4.121320344),
        (33.121320344, 0, 4.121320344),
    ]]
    chamfer(chamfer1_edges, length=CHAMFER1_SIZE)


solid = part.part
